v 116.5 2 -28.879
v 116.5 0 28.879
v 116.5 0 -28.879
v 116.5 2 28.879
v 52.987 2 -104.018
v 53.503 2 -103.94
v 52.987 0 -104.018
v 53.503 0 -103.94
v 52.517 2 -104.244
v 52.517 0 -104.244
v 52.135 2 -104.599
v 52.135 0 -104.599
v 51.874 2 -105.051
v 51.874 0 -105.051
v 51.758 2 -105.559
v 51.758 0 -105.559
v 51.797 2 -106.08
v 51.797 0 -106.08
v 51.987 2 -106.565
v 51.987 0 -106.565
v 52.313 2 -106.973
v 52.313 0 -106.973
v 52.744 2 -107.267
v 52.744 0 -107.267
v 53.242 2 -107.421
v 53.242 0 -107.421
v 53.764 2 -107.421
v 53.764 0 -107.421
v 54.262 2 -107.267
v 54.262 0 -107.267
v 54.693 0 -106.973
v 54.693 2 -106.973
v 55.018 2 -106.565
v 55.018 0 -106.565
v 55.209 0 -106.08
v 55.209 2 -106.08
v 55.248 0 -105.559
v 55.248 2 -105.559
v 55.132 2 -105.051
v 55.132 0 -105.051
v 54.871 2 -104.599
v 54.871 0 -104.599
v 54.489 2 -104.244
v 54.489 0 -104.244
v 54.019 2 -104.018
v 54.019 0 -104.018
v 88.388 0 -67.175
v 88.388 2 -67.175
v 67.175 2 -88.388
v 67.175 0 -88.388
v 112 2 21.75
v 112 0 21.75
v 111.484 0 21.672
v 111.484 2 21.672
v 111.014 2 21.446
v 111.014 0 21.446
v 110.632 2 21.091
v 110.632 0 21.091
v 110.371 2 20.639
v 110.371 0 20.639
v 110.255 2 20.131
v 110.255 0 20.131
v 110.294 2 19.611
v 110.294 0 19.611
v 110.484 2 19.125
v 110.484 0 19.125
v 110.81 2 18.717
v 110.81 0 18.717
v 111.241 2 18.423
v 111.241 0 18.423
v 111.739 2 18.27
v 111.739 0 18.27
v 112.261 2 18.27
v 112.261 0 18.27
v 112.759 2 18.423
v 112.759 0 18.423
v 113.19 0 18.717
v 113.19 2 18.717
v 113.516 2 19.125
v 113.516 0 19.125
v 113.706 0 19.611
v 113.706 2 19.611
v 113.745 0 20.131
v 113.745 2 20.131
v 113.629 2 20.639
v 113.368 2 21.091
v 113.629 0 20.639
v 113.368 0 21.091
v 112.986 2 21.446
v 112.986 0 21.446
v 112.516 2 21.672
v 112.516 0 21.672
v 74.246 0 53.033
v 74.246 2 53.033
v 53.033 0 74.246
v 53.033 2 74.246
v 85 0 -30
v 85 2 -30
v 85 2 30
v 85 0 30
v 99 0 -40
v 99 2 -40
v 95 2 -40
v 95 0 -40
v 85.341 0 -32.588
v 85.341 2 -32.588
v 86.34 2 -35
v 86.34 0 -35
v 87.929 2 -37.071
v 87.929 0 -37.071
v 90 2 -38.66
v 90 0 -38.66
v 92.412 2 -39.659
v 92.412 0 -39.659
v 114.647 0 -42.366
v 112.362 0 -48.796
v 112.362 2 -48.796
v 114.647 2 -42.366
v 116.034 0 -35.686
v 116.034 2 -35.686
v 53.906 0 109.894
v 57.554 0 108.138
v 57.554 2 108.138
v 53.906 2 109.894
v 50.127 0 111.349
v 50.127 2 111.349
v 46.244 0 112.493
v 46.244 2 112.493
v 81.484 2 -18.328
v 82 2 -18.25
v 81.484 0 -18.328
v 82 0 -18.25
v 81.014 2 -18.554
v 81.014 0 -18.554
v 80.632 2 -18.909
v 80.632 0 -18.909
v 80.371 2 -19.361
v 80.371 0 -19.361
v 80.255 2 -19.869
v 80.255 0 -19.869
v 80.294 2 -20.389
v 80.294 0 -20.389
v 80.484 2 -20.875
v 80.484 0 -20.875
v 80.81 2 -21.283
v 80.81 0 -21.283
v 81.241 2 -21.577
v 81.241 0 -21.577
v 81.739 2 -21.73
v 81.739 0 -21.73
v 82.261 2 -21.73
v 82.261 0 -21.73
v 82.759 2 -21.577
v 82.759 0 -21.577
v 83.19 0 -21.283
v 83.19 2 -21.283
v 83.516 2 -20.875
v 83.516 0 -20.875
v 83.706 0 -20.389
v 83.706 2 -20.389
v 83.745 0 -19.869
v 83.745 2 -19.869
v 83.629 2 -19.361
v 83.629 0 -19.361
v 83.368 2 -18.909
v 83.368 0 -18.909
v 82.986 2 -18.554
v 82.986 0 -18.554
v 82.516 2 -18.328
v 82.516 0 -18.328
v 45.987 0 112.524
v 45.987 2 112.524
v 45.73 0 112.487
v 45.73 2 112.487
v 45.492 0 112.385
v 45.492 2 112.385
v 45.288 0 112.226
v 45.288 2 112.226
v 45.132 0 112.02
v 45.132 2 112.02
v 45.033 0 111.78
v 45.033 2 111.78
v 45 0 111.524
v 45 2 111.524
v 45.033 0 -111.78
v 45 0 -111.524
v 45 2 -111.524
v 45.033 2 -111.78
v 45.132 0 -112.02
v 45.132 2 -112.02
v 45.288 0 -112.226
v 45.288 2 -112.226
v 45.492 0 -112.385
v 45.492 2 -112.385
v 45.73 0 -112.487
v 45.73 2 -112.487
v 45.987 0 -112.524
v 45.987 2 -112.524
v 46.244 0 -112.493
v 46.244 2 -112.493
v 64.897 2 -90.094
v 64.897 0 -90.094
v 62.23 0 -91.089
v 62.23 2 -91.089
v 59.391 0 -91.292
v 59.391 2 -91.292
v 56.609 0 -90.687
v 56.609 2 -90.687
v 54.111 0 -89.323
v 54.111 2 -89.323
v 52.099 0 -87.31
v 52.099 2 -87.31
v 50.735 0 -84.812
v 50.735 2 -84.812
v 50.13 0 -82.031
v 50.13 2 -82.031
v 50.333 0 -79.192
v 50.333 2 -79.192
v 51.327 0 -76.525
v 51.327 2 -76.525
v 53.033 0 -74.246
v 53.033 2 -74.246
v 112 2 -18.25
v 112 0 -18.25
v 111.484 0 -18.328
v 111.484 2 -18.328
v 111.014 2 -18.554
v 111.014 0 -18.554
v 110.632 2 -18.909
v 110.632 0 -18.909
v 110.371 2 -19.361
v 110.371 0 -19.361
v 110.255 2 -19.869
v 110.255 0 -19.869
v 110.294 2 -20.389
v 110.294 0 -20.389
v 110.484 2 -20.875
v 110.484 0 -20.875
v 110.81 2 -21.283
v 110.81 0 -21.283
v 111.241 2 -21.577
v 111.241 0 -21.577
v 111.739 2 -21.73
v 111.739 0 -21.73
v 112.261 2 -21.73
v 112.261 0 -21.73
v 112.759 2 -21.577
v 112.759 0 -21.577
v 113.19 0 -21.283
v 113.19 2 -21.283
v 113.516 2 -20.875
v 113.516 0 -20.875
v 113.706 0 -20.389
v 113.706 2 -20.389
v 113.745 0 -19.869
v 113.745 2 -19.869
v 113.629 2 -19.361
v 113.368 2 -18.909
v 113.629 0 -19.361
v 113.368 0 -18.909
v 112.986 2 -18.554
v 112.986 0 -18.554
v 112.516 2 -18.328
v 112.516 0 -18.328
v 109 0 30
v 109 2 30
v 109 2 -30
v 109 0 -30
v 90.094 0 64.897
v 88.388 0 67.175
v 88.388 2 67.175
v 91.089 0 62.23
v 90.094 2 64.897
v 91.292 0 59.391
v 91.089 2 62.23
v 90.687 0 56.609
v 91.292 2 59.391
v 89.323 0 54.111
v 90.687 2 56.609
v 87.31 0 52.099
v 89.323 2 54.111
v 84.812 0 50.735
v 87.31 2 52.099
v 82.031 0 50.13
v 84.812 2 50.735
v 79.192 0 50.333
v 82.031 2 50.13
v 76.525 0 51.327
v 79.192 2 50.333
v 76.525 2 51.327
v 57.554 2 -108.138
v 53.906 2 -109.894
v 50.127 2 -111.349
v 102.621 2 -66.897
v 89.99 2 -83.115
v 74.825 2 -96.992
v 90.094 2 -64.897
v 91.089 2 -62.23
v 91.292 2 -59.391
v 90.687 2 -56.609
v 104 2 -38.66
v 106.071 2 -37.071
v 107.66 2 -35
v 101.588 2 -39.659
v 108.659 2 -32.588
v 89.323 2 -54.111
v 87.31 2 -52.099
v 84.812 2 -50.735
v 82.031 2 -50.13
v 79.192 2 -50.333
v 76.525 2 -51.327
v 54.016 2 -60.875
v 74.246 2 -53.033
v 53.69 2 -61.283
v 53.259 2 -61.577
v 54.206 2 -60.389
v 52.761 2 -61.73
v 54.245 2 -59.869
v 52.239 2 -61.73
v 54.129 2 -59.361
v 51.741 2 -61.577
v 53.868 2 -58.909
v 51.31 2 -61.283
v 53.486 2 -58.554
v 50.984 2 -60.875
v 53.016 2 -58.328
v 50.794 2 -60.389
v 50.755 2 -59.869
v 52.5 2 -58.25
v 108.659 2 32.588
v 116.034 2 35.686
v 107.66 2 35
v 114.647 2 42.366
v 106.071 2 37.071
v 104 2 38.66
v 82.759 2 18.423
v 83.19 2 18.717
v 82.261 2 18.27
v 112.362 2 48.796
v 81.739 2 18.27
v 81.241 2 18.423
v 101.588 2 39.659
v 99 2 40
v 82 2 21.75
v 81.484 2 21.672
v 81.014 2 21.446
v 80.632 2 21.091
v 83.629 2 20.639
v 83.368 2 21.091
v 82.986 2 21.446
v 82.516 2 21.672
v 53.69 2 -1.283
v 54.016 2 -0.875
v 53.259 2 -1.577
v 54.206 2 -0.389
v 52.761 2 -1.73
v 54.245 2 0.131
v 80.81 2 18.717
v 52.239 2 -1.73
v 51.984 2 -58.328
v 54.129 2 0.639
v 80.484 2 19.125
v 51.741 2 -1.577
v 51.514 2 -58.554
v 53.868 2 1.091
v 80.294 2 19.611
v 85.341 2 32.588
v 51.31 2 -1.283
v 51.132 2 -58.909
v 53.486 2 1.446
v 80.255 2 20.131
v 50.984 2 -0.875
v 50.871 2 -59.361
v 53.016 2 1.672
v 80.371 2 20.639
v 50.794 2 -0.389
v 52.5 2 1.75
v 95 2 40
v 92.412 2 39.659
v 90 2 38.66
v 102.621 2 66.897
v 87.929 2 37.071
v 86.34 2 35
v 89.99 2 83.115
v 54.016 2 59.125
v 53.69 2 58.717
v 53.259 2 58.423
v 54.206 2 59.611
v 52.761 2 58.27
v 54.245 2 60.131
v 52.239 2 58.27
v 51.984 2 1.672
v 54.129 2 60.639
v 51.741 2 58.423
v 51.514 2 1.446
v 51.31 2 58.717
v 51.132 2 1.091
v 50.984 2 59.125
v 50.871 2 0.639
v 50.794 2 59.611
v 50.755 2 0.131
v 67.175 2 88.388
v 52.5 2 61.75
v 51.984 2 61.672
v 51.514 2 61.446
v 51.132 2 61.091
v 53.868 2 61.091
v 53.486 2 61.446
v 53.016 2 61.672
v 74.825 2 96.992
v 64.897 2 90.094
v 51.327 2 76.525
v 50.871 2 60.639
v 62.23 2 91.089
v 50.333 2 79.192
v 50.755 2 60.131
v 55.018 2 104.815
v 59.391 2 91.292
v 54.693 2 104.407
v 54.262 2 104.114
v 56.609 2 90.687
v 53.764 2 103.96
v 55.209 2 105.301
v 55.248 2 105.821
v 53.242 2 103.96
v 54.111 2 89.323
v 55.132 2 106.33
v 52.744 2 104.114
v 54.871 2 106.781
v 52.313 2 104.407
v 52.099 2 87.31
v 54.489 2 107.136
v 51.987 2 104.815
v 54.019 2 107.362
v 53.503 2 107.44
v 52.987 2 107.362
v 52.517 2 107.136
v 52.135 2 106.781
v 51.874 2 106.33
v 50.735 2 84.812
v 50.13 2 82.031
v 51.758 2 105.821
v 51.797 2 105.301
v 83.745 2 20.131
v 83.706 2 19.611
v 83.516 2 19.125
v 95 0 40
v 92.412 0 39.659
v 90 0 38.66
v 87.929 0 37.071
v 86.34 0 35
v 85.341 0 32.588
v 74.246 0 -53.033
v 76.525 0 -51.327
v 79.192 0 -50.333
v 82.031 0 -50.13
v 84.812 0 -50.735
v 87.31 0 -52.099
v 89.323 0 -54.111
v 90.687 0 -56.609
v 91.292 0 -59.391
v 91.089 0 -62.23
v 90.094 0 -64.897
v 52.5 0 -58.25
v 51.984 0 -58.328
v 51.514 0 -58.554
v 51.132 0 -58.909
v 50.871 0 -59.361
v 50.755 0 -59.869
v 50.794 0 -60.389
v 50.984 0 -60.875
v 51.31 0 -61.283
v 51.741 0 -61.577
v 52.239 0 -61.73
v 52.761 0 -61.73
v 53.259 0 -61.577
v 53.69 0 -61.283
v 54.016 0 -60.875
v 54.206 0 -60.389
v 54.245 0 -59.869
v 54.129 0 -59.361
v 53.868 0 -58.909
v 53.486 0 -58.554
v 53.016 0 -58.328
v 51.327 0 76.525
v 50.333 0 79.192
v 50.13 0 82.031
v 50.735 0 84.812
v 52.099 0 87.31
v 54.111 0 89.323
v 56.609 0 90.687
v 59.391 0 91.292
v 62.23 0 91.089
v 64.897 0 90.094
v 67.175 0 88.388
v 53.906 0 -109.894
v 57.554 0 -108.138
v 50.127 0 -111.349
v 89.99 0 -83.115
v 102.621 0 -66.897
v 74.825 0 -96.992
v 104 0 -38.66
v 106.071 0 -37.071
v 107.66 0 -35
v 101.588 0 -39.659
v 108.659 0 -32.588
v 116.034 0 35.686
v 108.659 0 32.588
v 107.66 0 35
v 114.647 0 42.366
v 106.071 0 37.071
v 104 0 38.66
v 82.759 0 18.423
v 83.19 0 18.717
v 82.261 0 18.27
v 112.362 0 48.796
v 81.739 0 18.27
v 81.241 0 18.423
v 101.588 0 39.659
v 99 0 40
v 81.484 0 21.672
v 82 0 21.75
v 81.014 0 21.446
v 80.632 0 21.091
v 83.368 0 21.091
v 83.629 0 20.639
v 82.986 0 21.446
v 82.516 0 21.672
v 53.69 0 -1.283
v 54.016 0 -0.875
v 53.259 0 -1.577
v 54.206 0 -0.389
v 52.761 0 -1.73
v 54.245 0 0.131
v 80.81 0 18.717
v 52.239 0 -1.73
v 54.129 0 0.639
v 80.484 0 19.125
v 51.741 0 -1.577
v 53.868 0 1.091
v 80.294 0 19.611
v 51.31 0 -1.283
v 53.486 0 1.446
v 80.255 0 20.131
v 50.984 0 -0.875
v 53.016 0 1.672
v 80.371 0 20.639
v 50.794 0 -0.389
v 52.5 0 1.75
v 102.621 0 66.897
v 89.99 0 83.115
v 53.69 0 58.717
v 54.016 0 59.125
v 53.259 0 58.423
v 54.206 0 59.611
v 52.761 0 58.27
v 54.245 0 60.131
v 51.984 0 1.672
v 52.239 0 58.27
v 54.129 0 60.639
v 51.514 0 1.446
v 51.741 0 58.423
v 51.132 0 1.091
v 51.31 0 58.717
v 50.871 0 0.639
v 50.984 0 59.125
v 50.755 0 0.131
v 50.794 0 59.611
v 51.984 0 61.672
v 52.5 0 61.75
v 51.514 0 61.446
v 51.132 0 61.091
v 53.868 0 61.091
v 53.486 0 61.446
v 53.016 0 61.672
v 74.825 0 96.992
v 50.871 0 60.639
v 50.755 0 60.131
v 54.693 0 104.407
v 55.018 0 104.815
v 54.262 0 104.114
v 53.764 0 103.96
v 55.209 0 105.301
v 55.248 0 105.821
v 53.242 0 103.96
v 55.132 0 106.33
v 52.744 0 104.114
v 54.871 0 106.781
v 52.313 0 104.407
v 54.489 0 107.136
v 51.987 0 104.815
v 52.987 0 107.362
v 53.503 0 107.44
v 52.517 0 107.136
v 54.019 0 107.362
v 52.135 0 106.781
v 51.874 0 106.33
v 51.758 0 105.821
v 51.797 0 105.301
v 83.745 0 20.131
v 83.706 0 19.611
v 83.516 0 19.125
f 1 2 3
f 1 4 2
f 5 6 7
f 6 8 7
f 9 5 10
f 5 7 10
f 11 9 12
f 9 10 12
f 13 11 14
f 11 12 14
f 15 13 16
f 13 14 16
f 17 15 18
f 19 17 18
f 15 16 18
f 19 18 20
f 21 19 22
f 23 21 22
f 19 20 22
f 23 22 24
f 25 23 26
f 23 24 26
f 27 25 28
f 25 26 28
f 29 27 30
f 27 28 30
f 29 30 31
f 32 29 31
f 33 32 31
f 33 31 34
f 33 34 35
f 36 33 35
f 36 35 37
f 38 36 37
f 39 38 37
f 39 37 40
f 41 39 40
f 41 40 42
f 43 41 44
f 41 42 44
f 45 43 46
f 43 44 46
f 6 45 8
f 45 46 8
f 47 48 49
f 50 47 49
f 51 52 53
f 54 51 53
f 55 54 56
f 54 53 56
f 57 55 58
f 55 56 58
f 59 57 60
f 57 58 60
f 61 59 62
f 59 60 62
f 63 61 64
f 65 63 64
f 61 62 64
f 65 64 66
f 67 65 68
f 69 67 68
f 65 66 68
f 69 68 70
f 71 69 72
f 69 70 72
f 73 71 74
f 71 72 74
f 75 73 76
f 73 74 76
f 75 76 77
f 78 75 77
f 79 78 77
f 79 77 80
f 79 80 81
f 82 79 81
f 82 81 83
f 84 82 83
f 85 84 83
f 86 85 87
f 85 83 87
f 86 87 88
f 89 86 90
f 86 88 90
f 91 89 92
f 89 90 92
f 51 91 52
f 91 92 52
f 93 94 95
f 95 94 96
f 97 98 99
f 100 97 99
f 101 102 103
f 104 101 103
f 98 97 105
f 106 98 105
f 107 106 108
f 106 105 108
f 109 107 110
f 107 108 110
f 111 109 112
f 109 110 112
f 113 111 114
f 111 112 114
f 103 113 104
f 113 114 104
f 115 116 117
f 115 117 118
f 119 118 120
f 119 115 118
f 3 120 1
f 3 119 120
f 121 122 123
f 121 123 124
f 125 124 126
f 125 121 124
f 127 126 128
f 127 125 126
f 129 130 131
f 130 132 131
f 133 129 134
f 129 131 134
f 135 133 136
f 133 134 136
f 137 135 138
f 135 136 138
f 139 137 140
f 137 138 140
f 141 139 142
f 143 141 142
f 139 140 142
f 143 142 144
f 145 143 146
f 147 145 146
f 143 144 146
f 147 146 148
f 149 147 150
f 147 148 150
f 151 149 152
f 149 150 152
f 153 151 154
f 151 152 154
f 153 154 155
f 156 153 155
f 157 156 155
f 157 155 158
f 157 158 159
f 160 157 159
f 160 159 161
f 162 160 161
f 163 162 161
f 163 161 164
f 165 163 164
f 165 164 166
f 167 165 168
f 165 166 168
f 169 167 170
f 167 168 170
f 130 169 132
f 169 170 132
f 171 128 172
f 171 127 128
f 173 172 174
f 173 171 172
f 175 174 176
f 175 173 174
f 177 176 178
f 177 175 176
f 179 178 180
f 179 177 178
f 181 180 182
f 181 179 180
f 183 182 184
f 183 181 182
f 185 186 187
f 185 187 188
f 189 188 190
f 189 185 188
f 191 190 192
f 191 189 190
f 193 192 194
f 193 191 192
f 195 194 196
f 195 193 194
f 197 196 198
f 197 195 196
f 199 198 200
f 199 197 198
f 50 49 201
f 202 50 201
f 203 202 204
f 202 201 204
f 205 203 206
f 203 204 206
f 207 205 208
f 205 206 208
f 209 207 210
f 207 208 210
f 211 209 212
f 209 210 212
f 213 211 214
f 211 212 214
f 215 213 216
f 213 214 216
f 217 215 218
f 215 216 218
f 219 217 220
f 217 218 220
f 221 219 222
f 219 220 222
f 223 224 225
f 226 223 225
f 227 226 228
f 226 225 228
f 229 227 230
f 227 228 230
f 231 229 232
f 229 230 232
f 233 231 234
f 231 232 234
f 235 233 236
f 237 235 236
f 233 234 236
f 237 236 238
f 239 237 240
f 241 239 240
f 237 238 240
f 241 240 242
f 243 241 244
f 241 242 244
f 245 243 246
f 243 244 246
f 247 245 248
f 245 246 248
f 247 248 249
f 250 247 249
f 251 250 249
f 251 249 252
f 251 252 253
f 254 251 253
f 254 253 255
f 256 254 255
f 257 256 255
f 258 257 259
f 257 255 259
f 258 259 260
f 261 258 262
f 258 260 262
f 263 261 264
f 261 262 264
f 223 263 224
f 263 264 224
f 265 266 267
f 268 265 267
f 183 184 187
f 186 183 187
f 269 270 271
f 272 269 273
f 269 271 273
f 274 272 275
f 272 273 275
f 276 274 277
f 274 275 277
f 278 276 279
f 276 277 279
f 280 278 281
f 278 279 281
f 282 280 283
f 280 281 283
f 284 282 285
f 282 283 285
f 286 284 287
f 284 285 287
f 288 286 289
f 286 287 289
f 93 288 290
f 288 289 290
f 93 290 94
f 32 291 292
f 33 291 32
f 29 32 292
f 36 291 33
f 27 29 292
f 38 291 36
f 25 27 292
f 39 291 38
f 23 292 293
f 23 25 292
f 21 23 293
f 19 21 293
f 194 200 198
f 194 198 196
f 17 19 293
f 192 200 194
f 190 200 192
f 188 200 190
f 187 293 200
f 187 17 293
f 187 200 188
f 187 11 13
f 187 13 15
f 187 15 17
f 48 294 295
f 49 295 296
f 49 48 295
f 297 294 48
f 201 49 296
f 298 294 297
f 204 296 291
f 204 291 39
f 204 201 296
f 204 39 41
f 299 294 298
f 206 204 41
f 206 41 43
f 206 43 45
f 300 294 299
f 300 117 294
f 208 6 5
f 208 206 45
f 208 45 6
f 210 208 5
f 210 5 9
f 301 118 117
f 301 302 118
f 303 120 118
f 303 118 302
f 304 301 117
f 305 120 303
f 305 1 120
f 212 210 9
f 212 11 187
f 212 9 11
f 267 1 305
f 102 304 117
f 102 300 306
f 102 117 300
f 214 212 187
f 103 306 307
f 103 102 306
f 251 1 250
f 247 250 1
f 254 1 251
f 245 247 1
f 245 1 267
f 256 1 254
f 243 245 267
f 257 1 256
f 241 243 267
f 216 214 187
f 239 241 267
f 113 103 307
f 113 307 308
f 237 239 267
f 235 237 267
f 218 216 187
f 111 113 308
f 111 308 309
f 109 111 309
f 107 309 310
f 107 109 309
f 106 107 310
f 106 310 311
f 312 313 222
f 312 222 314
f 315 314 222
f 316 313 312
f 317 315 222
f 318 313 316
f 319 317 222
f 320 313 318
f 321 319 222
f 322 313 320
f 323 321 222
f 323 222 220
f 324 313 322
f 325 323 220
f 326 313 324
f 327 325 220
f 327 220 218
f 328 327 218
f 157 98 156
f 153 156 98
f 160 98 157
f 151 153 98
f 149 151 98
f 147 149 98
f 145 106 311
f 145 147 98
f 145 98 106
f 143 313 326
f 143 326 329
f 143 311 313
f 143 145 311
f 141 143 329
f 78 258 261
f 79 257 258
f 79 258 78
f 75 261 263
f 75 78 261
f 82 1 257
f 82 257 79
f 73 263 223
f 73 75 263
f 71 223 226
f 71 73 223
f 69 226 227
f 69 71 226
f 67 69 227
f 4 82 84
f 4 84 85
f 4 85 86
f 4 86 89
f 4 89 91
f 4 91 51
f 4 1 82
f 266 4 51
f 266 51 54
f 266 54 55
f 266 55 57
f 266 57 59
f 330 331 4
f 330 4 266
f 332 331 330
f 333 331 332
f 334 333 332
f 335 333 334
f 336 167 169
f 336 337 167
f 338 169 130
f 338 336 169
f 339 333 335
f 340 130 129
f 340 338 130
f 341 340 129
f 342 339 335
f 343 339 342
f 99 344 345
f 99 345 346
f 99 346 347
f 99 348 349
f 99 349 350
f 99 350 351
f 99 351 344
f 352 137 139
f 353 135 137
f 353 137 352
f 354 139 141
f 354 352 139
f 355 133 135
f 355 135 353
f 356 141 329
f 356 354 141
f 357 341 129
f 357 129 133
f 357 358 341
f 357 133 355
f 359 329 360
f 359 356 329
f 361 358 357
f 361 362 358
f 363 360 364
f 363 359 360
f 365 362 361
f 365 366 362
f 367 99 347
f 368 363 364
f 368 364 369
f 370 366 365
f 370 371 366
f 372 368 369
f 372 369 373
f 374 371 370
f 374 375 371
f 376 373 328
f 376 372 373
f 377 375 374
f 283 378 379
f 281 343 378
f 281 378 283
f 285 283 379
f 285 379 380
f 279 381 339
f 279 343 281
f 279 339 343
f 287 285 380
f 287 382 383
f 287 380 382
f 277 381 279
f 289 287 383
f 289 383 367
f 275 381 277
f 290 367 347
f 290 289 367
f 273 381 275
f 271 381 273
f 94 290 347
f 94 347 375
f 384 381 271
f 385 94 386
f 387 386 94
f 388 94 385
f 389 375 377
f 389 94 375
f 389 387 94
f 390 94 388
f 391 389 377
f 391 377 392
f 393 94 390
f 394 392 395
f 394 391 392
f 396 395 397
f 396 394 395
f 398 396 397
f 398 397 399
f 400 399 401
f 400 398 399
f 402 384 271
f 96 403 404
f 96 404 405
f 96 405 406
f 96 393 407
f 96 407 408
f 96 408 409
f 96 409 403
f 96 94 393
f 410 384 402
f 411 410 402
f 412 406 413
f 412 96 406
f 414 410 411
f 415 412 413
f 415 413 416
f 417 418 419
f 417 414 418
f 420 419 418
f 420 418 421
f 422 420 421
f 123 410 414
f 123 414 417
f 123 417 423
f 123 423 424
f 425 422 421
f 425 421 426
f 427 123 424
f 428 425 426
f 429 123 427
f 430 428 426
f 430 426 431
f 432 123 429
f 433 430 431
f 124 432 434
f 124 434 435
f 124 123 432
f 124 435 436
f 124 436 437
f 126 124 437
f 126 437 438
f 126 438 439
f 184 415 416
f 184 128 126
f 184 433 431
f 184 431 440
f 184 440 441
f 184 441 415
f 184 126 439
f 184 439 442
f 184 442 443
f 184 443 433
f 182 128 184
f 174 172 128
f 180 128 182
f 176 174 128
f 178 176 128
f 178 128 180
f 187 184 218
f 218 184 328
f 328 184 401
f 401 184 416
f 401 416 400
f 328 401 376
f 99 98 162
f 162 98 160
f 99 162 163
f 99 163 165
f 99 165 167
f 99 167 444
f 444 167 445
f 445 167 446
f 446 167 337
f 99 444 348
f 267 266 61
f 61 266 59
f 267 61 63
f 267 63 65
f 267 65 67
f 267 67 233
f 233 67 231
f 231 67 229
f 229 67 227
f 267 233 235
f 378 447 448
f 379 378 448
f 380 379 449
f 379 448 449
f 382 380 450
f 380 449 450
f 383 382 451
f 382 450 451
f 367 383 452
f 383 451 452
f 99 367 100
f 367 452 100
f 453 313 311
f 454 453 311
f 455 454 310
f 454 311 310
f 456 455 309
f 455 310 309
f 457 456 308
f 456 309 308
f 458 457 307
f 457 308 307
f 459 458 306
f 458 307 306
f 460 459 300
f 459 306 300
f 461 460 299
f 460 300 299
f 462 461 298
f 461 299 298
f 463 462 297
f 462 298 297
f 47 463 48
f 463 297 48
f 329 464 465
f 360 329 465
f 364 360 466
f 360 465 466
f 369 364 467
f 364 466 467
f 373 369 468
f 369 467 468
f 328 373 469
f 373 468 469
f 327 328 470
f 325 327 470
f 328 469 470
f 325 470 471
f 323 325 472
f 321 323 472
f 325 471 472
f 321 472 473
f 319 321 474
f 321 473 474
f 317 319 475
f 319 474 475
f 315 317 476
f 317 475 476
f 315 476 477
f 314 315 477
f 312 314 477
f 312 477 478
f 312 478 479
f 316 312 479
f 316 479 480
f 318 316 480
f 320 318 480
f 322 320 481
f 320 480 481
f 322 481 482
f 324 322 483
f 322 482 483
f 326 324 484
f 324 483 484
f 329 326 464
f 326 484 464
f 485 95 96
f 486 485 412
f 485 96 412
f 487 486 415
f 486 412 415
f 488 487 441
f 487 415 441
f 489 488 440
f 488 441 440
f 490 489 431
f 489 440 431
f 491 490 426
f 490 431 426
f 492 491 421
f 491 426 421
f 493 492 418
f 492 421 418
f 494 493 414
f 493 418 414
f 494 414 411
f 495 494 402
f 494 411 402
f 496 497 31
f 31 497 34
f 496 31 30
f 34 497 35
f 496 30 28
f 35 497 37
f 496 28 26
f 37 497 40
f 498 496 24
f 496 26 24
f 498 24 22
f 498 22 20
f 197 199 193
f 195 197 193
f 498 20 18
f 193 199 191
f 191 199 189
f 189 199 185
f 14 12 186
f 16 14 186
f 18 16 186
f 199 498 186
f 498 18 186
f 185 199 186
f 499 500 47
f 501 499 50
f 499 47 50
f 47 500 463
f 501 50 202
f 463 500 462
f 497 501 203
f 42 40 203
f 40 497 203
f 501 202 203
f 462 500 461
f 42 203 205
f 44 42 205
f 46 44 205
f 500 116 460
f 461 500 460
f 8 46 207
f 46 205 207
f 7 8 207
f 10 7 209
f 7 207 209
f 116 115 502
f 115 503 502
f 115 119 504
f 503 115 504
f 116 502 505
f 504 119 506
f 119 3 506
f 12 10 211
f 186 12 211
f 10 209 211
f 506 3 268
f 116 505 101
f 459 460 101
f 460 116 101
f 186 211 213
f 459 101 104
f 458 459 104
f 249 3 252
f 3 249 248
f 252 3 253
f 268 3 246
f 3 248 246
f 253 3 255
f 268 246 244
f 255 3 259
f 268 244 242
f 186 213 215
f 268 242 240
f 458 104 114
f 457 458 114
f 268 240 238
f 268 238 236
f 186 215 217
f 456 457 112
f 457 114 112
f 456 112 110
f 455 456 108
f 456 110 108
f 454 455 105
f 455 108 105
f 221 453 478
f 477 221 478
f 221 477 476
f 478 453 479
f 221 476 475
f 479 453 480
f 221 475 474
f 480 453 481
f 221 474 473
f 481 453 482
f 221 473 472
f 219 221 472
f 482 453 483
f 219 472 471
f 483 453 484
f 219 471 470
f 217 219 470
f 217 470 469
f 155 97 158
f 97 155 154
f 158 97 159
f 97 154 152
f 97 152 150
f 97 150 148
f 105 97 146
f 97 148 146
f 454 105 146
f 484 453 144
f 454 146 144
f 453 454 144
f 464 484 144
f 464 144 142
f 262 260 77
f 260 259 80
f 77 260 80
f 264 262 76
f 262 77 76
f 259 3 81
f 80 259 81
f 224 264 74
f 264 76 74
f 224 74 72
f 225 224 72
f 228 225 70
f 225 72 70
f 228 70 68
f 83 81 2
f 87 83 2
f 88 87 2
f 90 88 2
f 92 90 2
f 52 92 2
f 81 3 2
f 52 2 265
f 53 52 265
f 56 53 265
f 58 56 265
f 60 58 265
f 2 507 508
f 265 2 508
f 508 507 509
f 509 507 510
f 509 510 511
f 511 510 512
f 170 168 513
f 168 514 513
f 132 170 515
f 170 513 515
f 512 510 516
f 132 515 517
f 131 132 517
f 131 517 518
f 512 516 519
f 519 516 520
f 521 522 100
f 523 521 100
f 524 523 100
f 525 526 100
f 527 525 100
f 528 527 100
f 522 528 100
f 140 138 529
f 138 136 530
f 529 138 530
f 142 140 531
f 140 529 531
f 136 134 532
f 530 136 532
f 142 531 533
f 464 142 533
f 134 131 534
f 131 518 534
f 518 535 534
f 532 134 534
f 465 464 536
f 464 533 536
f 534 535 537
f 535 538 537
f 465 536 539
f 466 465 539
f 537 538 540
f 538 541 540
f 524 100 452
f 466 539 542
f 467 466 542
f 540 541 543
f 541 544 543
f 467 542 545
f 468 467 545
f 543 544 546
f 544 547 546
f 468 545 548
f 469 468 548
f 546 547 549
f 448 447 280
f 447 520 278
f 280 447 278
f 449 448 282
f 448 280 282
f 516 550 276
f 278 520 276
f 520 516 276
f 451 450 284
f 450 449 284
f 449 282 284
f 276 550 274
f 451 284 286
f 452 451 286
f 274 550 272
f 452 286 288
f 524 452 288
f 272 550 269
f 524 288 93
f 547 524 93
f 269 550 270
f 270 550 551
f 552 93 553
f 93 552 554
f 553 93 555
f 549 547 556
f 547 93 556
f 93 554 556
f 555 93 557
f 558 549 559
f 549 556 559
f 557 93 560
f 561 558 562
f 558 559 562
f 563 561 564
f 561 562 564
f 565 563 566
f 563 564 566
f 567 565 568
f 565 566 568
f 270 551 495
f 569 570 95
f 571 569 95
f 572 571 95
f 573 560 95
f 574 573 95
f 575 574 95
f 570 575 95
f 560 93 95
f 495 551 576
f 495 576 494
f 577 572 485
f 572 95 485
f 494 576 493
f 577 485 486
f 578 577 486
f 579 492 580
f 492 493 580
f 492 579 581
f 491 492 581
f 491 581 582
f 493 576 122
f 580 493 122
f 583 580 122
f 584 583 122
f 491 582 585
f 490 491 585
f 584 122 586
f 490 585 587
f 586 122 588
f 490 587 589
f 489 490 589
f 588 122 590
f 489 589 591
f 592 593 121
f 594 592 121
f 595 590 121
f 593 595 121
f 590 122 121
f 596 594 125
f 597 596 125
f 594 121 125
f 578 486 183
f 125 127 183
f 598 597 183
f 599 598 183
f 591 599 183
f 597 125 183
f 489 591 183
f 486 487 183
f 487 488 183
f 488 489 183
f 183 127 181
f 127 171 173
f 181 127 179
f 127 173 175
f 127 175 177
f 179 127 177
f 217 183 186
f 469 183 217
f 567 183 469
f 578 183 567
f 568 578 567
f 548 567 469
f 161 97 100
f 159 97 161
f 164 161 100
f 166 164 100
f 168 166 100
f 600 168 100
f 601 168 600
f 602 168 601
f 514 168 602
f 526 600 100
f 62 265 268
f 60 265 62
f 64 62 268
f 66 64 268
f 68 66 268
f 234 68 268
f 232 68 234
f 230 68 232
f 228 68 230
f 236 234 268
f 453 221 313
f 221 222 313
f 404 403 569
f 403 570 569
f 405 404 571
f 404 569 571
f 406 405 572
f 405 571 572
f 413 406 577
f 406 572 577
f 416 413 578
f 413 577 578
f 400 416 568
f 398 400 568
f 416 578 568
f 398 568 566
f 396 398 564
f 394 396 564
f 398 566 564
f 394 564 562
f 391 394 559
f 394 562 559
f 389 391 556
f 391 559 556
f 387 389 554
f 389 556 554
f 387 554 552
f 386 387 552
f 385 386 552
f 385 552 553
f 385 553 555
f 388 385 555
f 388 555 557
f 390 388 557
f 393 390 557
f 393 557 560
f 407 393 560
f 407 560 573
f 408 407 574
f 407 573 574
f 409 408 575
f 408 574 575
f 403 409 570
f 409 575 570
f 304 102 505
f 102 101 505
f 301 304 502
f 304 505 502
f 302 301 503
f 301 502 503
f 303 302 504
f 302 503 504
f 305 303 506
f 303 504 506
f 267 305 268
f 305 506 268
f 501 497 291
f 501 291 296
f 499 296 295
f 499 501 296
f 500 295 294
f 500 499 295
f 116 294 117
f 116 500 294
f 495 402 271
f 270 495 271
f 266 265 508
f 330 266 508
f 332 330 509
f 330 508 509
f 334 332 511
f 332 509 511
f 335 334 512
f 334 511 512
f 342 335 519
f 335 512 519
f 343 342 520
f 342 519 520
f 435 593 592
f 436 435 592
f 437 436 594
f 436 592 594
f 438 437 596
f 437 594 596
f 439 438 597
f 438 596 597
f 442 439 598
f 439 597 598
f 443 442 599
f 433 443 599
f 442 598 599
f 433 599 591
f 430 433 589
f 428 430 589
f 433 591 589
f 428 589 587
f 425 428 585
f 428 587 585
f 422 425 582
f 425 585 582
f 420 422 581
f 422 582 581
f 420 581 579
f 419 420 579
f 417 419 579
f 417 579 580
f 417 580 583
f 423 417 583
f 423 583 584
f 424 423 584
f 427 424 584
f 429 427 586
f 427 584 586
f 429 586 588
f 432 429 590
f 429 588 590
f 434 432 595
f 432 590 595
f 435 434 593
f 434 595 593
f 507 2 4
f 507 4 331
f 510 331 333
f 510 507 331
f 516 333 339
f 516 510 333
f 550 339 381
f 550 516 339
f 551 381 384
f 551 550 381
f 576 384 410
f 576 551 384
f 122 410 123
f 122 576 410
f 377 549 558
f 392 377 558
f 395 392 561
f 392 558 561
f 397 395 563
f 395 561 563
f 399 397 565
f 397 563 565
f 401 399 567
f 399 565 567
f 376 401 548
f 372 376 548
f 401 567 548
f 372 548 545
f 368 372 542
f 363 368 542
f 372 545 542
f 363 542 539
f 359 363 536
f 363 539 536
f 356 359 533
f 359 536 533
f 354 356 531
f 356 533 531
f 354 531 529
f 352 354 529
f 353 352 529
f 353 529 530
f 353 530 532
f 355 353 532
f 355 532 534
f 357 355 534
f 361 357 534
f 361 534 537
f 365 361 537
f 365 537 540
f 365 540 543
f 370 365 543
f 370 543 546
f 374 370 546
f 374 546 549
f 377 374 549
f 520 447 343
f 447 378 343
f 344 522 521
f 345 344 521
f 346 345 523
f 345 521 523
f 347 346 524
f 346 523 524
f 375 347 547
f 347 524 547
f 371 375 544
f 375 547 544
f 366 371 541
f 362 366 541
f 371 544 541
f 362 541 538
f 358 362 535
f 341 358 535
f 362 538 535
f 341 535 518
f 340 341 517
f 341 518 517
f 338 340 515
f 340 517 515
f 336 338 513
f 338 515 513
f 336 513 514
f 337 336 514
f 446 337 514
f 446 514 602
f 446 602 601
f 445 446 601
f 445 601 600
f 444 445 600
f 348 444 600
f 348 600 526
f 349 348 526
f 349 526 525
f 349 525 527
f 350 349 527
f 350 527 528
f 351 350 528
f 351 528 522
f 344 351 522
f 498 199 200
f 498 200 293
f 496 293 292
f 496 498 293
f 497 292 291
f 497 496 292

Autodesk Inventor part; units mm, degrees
ref_plane "YZ Plane" through (0, 0, 0) normal (1, 0, 0) x (0, 1, 0)
ref_plane "XZ Plane" through (0, 0, 0) normal (0, 1, 0) x (-1, 0, 0)
ref_plane "XY Plane" through (0, 0, 0) normal (0, 0, 1) x (1, 0, 0)
sketch "スケッチ1" plane through (0, 0, 0) normal (0, 1, 0) x (-1, 0, 0)
  circle A0 centre (0, 0) radius 122.5
  dimension "d0" = 245
extrude "プレート1" add sketch "スケッチ1" along normal blind 2
sketch "スケッチ2" plane through (0, 2, 0) normal (0, 1, 0) x (1, 0, 0)
  line L0 (85, -40) -> (109, -40)
  line L1 (109, -40) -> (109, 40)
  line L2 (109, 40) -> (85, 40)
  line L3 (85, 40) -> (85, -40)
  line L4 (85, -40) -> (109, 40) construction
  line L5 (109, -40) -> (85, 40) construction
  point P0 (0, 0)
  point P1 (97, 0)
  dimension "d2" = 24
  dimension "d3" = 85
  dimension "d6" = 80
extrude "押し出し1" cut sketch "スケッチ2" against normal through all
fillet "フィレット1" radius 10 4 edges at (109, 1, 40) (85, 1, 40) (85, 1, -40) (109, 1, -40)
sketch "スケッチ3" plane through (0, 2, 0) normal (0, 1, 0) x (1, 0, 0)
  line L0 (85, -30) -> (85, 30) projected
  line L1 (109, 30) -> (109, -30) projected
  line L2 (95, 40) -> (99, 40) projected
  line L3 (99, -40) -> (95, -40) projected
  line L4 (82, -20) -> (112, -20) construction
  line L5 (112, -20) -> (112, 20) construction
  line L6 (112, 20) -> (82, 20) construction
  line L7 (82, 20) -> (82, -20) construction
  line L8 (82, -20) -> (112, 20) construction
  line L9 (112, -20) -> (82, 20) construction
  point P0 (0, 0)
  point P1 (97, 0)
  point P2 (97, 40)
  point P3 (109, 0)
  dimension "d8" = 30
  dimension "d9" = 40
hole "穴1" at (82, 2, 20) at (112, 2, 20) at (112, 2, -20) at (82, 2, -20) direction (0, -1, 0) diameter 3.5 depth 2 tip angle 118
sketch "スケッチ4" plane through (0, 2, 0) normal (0, 1, 0) x (1, 0, 0)
  circle A0 centre (0, 0) radius 122.5 projected
  line L0 (-109.4589, 55) -> (-60, 30)
  line L1 (-60, 30) -> (-60, -30)
  line L2 (-60, -30) -> (-109.4589, -55)
  point P0 (-60, 0)
  dimension "d17" = 30
  dimension "d18" = 55
  dimension "d19" = 60
extrude "押し出し2" cut sketch "スケッチ4" against normal through all contours L0 L1 L2 A0 picked at (-80.8333, 0)
sketch "スケッチ5" plane through (0, 2, 0) normal (0, 1, 0) x (1, 0, 0)
  line L0 (-40, 87) -> (40, 87)
  line L1 (40, 87) -> (40, 106)
  line L2 (40, 106) -> (-40, 106)
  line L3 (-40, 106) -> (-40, 87)
  line L4 (-40, 87) -> (40, 106) construction
  line L5 (40, 87) -> (-40, 106) construction
  line L6 (-13.5, 81.5) -> (13.5, 81.5)
  line L7 (13.5, 81.5) -> (13.5, 87)
  line L8 (13.5, 87) -> (-13.5, 87)
  line L9 (-13.5, 87) -> (-13.5, 81.5)
  line L10 (-13.5, 81.5) -> (13.5, 87) construction
  line L11 (13.5, 81.5) -> (-13.5, 87) construction
  line L12 (-13.5, 81.5) -> (-12.7575, 82.2425) construction
  line L13 (-13.5, 81.5) -> (-12.45, 81.5) construction
  line L14 (13.5, 81.5) -> (12.7575, 82.2425) construction
  line L15 (13.5, 81.5) -> (14.55, 81.5) construction
  circle A0 centre (12.7575, 82.2425) radius 1.05
  circle A1 centre (-12.7575, 82.2425) radius 1.05
  line L16 (-13.5, 111.5) -> (13.5, 111.5)
  line L17 (13.5, 111.5) -> (13.5, 106)
  line L18 (13.5, 106) -> (-13.5, 106)
  line L19 (-13.5, 106) -> (-13.5, 111.5)
  line L20 (-13.5, 111.5) -> (13.5, 106) construction
  line L21 (13.5, 111.5) -> (-13.5, 106) construction
  line L22 (-13.5, 111.5) -> (-12.7575, 110.7575) construction
  line L23 (-13.5, 111.5) -> (-12.45, 111.5) construction
  line L24 (13.5, 111.5) -> (12.7575, 110.7575) construction
  line L25 (13.5, 111.5) -> (14.55, 111.5) construction
  circle A2 centre (-12.7575, 110.7575) radius 1.05
  circle A3 centre (12.7575, 110.7575) radius 1.05
  point P0 (0, 0)
  point P1 (0, 96.5)
  point P2 (0, 84.25)
  point P3 (-13.5, 82.9849)
  point P4 (-12.0151, 81.5)
  point P5 (12.0151, 81.5)
  point P6 (13.5, 82.9849)
  point P7 (0, 108.75)
  point P8 (-13.5, 110.0151)
  point P9 (13.5, 110.0151)
  point P10 (12.0151, 111.5)
  point P11 (-12.0151, 111.5)
  dimension "d22" = 19
  dimension "d23" = 80
  dimension "d24" = 87
  dimension "d25" = 5.5
  dimension "d26" = 27
  dimension "d27" = 1.05
  dimension "d28" = 45
  dimension "d29" = 1.05
  dimension "d30" = 135
  dimension "d46" = 5.5
  dimension "d47" = 1.05
  dimension "d48" = 45
  dimension "d49" = 1.05
  dimension "d50" = 135
extrude "押し出し3" cut sketch "スケッチ5" against normal through all
sketch "スケッチ6" plane through (0, 2, 0) normal (0, 1, 0) x (1, 0, 0)
  line L0 (-20, 84) -> (20, 84) construction
  line L1 (-20, 84) -> (20, 84) construction
  line L2 (12.0151, 81.5) -> (-12.0151, 81.5) construction
  line L3 (-20, 109) -> (20, 109) construction
  line L4 (13.5, 106) -> (40, 106) construction
  line L5 (-20, 109) -> (20, 109) construction
  line L6 (-12.0151, 111.5) -> (12.0151, 111.5) construction
  point P0 (0, 0)
  point P1 (0, 84)
  point P2 (0, 109)
  point P3 (0, 84)
  dimension "d33" = 40
  dimension "d34" = 0
  dimension "d35" = 2.5
  dimension "d51" = 40
  dimension "d52" = 0
  dimension "d53" = 2.5
hole "穴2" at (20, 2, -84) at (-20, 2, -84) at (-20, 2, -109) at (20, 2, -109) direction (0, -1, 0) diameter 3.5 depth 2 tip angle 118
fillet "フィレット2" radius 1 4 edges at (-13.5, 1, -87) (13.5, 1, -87) (-13.5, 1, -106) (13.5, 1, -106)
fillet "フィレット3" radius 3 4 edges at (-40, 1, -87) (-40, 1, -106) (40, 1, -106) (40, 1, -87)
mirror "ミラー1" about plane through (0, 0, 0) normal (0, 0, 1) of "穴2", "押し出し3", "フィレット2", "フィレット3"
sketch "スケッチ8" plane through (0, 2, 0) normal (0, 1, 0) x (1, 0, 0)
  arc A0 (-109.4589, -55) -> (-109.4589, 55) centre (0, 0) ccw projected
  line L0 (-12.0151, 111.5) -> (12.0151, 111.5) projected
  line L1 (-44.8358, 114) -> (44.8358, 114)
  line L2 (-44.8358, -114) -> (44.8358, -114)
  line L3 (116.5, -37.8682) -> (116.5, 37.8682)
  arc A1 (-109.4589, -55) -> (-109.4589, 55) centre (0, 0) ccw projected
  circle A2 centre (112, 20) radius 1.75 projected
  line L4 (12.0151, -111.5) -> (-12.0151, -111.5) projected
  dimension "d61" = 4.5
  dimension "d62" = 2.5
  dimension "d63" = 2.5
extrude "押し出し5" cut sketch "スケッチ8" against normal through all contours L2 A0 | L3 A0 | L1 A0
fillet "フィレット5" radius 50 6 edges at (44.8358, 1, 114) (-44.8358, 1, 114) (116.5, 1, -37.8682) (116.5, 1, 37.8682) (-44.8358, 1, -114) (44.8358, 1, -114)
sketch "スケッチ9" plane through (0, 2, 0) normal (0, 1, 0) x (1, 0, 0)
  line L0 (12.0151, 81.5) -> (-12.0151, 81.5) projected
  line L1 (-14.5, 87) -> (-37, 87) projected
  line L2 (37, 87) -> (14.5, 87) projected
  point P0 (0, 0)
  point P1 (-35, 82)
  point P2 (-35, 74)
  point P3 (35, 82)
  point P4 (35, 74)
  dimension "d73" = 8
  dimension "d74" = 8
  dimension "d75" = 35
  dimension "d76" = 35
  dimension "d86" = 5
  dimension "d87" = 5
hole "穴3" at (-35, 2, -82) at (-35, 2, -74) at (35, 2, -82) at (35, 2, -74) direction (0, -1, 0) diameter 3.2 end through all
sketch "スケッチ10" plane through (0, 2, 0) normal (0, 1, 0) x (1, 0, 0)
  line L0 (60.1041, 81.3173) -> (81.3173, 60.1041) construction
  line L1 (53.033, 74.2462) -> (74.2462, 53.033)
  line L2 (88.3883, 67.1751) -> (67.1751, 88.3883)
  arc A0 (67.1751, 88.3883) -> (53.033, 74.2462) centre (60.1041, 81.3173) ccw
  arc A1 (74.2462, 53.033) -> (88.3883, 67.1751) centre (81.3173, 60.1041) ccw
  line L3 (-15, 35) -> (15, 35) construction
  line L4 (-15, 20) -> (15, 20)
  line L5 (15, 50) -> (-15, 50)
  arc A2 (-15, 50) -> (-15, 20) centre (-15, 35) ccw
  arc A3 (15, 20) -> (15, 50) centre (15, 35) ccw
  line L6 (116.5, -28.8791) -> (116.5, 28.8791) projected
  line L7 (0, 0) -> (70.7107, 70.7107) construction
  point P0 (0, 35)
  dimension "d88" = 30
  dimension "d89" = 10
  dimension "d90" = 135
  dimension "d91" = 100
  dimension "d92" = 30
  dimension "d93" = 15
  dimension "d94" = 35
extrude "押し出し6" cut sketch "スケッチ10" against normal through all
mirror "ミラー2" about plane through (0, 0, 0) normal (0, 0, 1) of "穴3", "押し出し6"
fillet "フィレット6" radius 2 4 edges at (-109.4589, 1, -55) (-60, 1, -30) (-60, 1, 30) (-109.4589, 1, 55)
sketch "スケッチ11" plane through (0, 2, 0) normal (0, 1, 0) x (1, 0, 0)
  arc A0 (-57.5538, 108.1379) -> (-108.5332, 56.8048) centre (0, 0) ccw projected
  arc A1 (-55.9094, 105.0483) -> (-106.3353, 53.4211) centre (0, 0) ccw construction
  line L0 (-107.6635, 54.0925) -> (-61.0978, 30.5549) construction
  line L1 (-106.3353, 53.4211) -> (0, 0) construction
  line L2 (0, 0) -> (-73.7957, 93.3552) construction
  point P0 (-103.9973, 57.8408)
  point P1 (-77.6522, 90.1728)
  dimension "d98" = 3.5
  dimension "d99" = 25
  dimension "d100" = 5
  dimension "d101" = 5
hole "穴4" at (-103.9973, 2, -57.8408) at (-77.6522, 2, -90.1728) direction (0, -1, 0) diameter 3.5 end through all
mirror "ミラー3" about plane through (0, 0, 0) normal (0, 0, 1) of "穴4"
sketch "スケッチ12" plane through (0, 2, 0) normal (0, 1, 0) x (1, 0, 0)
  line L0 (-52, 45) -> (-52, 35) construction
  line L1 (-52, 45) -> (-42, 45) construction
  line L2 (-52, -35) -> (-52, -45) construction
  line L3 (-52, -35) -> (-42, -35) construction
  point P0 (0, 0)
  point P1 (-52, 40)
  point P2 (-52, -40)
  dimension "d109" = 10
  dimension "d110" = 90
  dimension "d111" = 10
  dimension "d112" = 90
  dimension "d113" = 40
  dimension "d114" = 40
  dimension "d115" = 52
  dimension "d116" = 52
hole "穴5" at (-52, 2, -45) at (-52, 2, -35) at (-52, 2, 35) at (-52, 2, 45) direction (0, -1, 0) diameter 3.5 depth 2
sketch "スケッチ13" plane through (0, 2, 0) normal (0, 1, 0) x (1, 0, 0)
  arc A0 (57.5538, 108.1379) -> (34.0624, 114) centre (34.0624, 64) ccw projected
  arc A1 (34.0624, -114) -> (57.5538, -108.1379) centre (34.0624, -64) ccw projected
  line L0 (45, 112.789) -> (45, -112.789) construction
  line L1 (45, 112.789) -> (270.5781, 112.789) construction
  line L2 (37.5, -60) -> (52.5, -60) construction
  line L3 (52.5, -60) -> (52.5, 60) construction
  line L4 (52.5, 60) -> (37.5, 60) construction
  line L5 (37.5, 60) -> (37.5, -60) construction
  line L6 (37.5, -60) -> (52.5, 60) construction
  line L7 (52.5, -60) -> (37.5, 60) construction
  arc A2 (34.0624, -110) -> (53.5029, -105.6902) centre (34.0624, -64) ccw construction
  line L8 (34.0624, -64) -> (53.5029, -105.6902) construction
  line L9 (34.0624, -64) -> (34.0624, -110) construction
  arc A3 (53.5029, 105.6902) -> (34.0624, 110) centre (34.0624, 64) ccw construction
  line L10 (34.0624, 64) -> (34.0624, 110) construction
  line L11 (34.0624, 64) -> (80.0624, 64) construction
  line L12 (34.0624, 64) -> (53.5029, 105.6902) construction
  point P0 (0, 0)
  point P1 (45, 0)
  point P2 (52.5, 0)
  point P3 (37.5, 0)
  dimension "d124" = 90
  dimension "d125" = 45
  dimension "d126" = 15
  dimension "d127" = 120
  dimension "d135" = 25
  dimension "d136" = 46
  dimension "d137" = 46
  dimension "d138" = 90
  dimension "d139" = 25
hole "穴6" at (37.5, 2, -60) at (52.5, 2, -60) at (52.5, 2, 0) at (37.5, 2, 0) at (37.5, 2, 60) at (52.5, 2, 60) at (34.0624, 2, -110) at (53.5029, 2, -105.6902) at (34.0624, 2, 110) at (53.5029, 2, 105.6902) direction (0, -1, 0) diameter 3.5 end through all
sketch "スケッチ14" plane through (0, 2, 0) normal (0, 1, 0) x (1, 0, 0)
  arc A0 (57.5538, 108.1379) -> (34.0624, 114) centre (34.0624, 64) ccw projected
  line L0 (34.0624, 114) -> (-34.0624, 114) projected
  arc A1 (-34.0624, 114) -> (-57.5538, 108.1379) centre (-34.0624, 64) ccw projected
  arc A2 (-57.5538, 108.1379) -> (-108.5332, 56.8048) centre (0, 0) ccw projected
  arc A3 (-108.5332, 56.8048) -> (-107.6635, 54.0925) centre (-106.7613, 55.8774) ccw projected
  line L1 (-107.6635, 54.0925) -> (-61.0978, 30.5549) projected
  arc A4 (-60, 28.77) -> (-61.0978, 30.5549) centre (-62, 28.77) ccw projected
  line L2 (-60, 28.77) -> (-60, -28.77) projected
  arc A5 (-61.0978, -30.5549) -> (-60, -28.77) centre (-62, -28.77) ccw projected
  line L3 (-61.0978, -30.5549) -> (-107.6635, -54.0925) projected
  arc A6 (-107.6635, -54.0925) -> (-108.5332, -56.8048) centre (-106.7613, -55.8774) ccw projected
  arc A7 (-108.5332, -56.8048) -> (-57.5538, -108.1379) centre (0, 0) ccw projected
  arc A8 (-57.5538, -108.1379) -> (-34.0624, -114) centre (-34.0624, -64) ccw projected
  line L4 (-34.0624, -114) -> (34.0624, -114) projected
  arc A9 (34.0624, -114) -> (57.5538, -108.1379) centre (34.0624, -64) ccw projected
  line L5 (45, -112.789) -> (45, 112.789)
  arc A10 (57.5538, 108.1379) -> (34.0624, 114) centre (34.0624, 64) ccw projected
  dimension "d140" = 45
extrude "押し出し7" cut sketch "スケッチ14" against normal through all
fillet "フィレット7" radius 1 2 edges at (45, 1, 112.789) (45, 1, -112.789)
equation "\"d15\" = Thickness"
equation "\"d46\" = d25"
equation "\"d53\" = d35"
equation "\"d41\" = Thickness"
equation "\"d63\" = d62"
equation "\"d73\" = d71"
equation "\"d74\" = d71"
equation "\"d76\" = d75"
equation "\"d87\" = d86"
equation "\"d84\" = Thickness"
equation "\"d101\" = d100"
equation "\"d107\" = Thickness"
equation "\"d114\" = d113"
equation "\"d116\" = d115"
equation "\"d122\" = Thickness"
equation "\"d133\" = Thickness"
equation "\"d1\" = Thickness"
equation "\"BendRadius\" = Thickness"
equation "\"BendReliefWidth\" = Thickness"
equation "\"BendReliefDepth\" = 0.5 * Thickness"
equation "\"CornerReliefSize\" = 4 * Thickness"
equation "\"MinimumRemnant\" = 2 * Thickness"
equation "\"TransitionRadius\" = BendRadius"
equation "\"JacobiRadiusSize\" = BendRadius"
equation "\"GapSize\" = Thickness"
equation "\"Thickness\" = 2"
equation "\"d71\" = 8"
properties part number "T2.0_frame-base2-extended-1"
